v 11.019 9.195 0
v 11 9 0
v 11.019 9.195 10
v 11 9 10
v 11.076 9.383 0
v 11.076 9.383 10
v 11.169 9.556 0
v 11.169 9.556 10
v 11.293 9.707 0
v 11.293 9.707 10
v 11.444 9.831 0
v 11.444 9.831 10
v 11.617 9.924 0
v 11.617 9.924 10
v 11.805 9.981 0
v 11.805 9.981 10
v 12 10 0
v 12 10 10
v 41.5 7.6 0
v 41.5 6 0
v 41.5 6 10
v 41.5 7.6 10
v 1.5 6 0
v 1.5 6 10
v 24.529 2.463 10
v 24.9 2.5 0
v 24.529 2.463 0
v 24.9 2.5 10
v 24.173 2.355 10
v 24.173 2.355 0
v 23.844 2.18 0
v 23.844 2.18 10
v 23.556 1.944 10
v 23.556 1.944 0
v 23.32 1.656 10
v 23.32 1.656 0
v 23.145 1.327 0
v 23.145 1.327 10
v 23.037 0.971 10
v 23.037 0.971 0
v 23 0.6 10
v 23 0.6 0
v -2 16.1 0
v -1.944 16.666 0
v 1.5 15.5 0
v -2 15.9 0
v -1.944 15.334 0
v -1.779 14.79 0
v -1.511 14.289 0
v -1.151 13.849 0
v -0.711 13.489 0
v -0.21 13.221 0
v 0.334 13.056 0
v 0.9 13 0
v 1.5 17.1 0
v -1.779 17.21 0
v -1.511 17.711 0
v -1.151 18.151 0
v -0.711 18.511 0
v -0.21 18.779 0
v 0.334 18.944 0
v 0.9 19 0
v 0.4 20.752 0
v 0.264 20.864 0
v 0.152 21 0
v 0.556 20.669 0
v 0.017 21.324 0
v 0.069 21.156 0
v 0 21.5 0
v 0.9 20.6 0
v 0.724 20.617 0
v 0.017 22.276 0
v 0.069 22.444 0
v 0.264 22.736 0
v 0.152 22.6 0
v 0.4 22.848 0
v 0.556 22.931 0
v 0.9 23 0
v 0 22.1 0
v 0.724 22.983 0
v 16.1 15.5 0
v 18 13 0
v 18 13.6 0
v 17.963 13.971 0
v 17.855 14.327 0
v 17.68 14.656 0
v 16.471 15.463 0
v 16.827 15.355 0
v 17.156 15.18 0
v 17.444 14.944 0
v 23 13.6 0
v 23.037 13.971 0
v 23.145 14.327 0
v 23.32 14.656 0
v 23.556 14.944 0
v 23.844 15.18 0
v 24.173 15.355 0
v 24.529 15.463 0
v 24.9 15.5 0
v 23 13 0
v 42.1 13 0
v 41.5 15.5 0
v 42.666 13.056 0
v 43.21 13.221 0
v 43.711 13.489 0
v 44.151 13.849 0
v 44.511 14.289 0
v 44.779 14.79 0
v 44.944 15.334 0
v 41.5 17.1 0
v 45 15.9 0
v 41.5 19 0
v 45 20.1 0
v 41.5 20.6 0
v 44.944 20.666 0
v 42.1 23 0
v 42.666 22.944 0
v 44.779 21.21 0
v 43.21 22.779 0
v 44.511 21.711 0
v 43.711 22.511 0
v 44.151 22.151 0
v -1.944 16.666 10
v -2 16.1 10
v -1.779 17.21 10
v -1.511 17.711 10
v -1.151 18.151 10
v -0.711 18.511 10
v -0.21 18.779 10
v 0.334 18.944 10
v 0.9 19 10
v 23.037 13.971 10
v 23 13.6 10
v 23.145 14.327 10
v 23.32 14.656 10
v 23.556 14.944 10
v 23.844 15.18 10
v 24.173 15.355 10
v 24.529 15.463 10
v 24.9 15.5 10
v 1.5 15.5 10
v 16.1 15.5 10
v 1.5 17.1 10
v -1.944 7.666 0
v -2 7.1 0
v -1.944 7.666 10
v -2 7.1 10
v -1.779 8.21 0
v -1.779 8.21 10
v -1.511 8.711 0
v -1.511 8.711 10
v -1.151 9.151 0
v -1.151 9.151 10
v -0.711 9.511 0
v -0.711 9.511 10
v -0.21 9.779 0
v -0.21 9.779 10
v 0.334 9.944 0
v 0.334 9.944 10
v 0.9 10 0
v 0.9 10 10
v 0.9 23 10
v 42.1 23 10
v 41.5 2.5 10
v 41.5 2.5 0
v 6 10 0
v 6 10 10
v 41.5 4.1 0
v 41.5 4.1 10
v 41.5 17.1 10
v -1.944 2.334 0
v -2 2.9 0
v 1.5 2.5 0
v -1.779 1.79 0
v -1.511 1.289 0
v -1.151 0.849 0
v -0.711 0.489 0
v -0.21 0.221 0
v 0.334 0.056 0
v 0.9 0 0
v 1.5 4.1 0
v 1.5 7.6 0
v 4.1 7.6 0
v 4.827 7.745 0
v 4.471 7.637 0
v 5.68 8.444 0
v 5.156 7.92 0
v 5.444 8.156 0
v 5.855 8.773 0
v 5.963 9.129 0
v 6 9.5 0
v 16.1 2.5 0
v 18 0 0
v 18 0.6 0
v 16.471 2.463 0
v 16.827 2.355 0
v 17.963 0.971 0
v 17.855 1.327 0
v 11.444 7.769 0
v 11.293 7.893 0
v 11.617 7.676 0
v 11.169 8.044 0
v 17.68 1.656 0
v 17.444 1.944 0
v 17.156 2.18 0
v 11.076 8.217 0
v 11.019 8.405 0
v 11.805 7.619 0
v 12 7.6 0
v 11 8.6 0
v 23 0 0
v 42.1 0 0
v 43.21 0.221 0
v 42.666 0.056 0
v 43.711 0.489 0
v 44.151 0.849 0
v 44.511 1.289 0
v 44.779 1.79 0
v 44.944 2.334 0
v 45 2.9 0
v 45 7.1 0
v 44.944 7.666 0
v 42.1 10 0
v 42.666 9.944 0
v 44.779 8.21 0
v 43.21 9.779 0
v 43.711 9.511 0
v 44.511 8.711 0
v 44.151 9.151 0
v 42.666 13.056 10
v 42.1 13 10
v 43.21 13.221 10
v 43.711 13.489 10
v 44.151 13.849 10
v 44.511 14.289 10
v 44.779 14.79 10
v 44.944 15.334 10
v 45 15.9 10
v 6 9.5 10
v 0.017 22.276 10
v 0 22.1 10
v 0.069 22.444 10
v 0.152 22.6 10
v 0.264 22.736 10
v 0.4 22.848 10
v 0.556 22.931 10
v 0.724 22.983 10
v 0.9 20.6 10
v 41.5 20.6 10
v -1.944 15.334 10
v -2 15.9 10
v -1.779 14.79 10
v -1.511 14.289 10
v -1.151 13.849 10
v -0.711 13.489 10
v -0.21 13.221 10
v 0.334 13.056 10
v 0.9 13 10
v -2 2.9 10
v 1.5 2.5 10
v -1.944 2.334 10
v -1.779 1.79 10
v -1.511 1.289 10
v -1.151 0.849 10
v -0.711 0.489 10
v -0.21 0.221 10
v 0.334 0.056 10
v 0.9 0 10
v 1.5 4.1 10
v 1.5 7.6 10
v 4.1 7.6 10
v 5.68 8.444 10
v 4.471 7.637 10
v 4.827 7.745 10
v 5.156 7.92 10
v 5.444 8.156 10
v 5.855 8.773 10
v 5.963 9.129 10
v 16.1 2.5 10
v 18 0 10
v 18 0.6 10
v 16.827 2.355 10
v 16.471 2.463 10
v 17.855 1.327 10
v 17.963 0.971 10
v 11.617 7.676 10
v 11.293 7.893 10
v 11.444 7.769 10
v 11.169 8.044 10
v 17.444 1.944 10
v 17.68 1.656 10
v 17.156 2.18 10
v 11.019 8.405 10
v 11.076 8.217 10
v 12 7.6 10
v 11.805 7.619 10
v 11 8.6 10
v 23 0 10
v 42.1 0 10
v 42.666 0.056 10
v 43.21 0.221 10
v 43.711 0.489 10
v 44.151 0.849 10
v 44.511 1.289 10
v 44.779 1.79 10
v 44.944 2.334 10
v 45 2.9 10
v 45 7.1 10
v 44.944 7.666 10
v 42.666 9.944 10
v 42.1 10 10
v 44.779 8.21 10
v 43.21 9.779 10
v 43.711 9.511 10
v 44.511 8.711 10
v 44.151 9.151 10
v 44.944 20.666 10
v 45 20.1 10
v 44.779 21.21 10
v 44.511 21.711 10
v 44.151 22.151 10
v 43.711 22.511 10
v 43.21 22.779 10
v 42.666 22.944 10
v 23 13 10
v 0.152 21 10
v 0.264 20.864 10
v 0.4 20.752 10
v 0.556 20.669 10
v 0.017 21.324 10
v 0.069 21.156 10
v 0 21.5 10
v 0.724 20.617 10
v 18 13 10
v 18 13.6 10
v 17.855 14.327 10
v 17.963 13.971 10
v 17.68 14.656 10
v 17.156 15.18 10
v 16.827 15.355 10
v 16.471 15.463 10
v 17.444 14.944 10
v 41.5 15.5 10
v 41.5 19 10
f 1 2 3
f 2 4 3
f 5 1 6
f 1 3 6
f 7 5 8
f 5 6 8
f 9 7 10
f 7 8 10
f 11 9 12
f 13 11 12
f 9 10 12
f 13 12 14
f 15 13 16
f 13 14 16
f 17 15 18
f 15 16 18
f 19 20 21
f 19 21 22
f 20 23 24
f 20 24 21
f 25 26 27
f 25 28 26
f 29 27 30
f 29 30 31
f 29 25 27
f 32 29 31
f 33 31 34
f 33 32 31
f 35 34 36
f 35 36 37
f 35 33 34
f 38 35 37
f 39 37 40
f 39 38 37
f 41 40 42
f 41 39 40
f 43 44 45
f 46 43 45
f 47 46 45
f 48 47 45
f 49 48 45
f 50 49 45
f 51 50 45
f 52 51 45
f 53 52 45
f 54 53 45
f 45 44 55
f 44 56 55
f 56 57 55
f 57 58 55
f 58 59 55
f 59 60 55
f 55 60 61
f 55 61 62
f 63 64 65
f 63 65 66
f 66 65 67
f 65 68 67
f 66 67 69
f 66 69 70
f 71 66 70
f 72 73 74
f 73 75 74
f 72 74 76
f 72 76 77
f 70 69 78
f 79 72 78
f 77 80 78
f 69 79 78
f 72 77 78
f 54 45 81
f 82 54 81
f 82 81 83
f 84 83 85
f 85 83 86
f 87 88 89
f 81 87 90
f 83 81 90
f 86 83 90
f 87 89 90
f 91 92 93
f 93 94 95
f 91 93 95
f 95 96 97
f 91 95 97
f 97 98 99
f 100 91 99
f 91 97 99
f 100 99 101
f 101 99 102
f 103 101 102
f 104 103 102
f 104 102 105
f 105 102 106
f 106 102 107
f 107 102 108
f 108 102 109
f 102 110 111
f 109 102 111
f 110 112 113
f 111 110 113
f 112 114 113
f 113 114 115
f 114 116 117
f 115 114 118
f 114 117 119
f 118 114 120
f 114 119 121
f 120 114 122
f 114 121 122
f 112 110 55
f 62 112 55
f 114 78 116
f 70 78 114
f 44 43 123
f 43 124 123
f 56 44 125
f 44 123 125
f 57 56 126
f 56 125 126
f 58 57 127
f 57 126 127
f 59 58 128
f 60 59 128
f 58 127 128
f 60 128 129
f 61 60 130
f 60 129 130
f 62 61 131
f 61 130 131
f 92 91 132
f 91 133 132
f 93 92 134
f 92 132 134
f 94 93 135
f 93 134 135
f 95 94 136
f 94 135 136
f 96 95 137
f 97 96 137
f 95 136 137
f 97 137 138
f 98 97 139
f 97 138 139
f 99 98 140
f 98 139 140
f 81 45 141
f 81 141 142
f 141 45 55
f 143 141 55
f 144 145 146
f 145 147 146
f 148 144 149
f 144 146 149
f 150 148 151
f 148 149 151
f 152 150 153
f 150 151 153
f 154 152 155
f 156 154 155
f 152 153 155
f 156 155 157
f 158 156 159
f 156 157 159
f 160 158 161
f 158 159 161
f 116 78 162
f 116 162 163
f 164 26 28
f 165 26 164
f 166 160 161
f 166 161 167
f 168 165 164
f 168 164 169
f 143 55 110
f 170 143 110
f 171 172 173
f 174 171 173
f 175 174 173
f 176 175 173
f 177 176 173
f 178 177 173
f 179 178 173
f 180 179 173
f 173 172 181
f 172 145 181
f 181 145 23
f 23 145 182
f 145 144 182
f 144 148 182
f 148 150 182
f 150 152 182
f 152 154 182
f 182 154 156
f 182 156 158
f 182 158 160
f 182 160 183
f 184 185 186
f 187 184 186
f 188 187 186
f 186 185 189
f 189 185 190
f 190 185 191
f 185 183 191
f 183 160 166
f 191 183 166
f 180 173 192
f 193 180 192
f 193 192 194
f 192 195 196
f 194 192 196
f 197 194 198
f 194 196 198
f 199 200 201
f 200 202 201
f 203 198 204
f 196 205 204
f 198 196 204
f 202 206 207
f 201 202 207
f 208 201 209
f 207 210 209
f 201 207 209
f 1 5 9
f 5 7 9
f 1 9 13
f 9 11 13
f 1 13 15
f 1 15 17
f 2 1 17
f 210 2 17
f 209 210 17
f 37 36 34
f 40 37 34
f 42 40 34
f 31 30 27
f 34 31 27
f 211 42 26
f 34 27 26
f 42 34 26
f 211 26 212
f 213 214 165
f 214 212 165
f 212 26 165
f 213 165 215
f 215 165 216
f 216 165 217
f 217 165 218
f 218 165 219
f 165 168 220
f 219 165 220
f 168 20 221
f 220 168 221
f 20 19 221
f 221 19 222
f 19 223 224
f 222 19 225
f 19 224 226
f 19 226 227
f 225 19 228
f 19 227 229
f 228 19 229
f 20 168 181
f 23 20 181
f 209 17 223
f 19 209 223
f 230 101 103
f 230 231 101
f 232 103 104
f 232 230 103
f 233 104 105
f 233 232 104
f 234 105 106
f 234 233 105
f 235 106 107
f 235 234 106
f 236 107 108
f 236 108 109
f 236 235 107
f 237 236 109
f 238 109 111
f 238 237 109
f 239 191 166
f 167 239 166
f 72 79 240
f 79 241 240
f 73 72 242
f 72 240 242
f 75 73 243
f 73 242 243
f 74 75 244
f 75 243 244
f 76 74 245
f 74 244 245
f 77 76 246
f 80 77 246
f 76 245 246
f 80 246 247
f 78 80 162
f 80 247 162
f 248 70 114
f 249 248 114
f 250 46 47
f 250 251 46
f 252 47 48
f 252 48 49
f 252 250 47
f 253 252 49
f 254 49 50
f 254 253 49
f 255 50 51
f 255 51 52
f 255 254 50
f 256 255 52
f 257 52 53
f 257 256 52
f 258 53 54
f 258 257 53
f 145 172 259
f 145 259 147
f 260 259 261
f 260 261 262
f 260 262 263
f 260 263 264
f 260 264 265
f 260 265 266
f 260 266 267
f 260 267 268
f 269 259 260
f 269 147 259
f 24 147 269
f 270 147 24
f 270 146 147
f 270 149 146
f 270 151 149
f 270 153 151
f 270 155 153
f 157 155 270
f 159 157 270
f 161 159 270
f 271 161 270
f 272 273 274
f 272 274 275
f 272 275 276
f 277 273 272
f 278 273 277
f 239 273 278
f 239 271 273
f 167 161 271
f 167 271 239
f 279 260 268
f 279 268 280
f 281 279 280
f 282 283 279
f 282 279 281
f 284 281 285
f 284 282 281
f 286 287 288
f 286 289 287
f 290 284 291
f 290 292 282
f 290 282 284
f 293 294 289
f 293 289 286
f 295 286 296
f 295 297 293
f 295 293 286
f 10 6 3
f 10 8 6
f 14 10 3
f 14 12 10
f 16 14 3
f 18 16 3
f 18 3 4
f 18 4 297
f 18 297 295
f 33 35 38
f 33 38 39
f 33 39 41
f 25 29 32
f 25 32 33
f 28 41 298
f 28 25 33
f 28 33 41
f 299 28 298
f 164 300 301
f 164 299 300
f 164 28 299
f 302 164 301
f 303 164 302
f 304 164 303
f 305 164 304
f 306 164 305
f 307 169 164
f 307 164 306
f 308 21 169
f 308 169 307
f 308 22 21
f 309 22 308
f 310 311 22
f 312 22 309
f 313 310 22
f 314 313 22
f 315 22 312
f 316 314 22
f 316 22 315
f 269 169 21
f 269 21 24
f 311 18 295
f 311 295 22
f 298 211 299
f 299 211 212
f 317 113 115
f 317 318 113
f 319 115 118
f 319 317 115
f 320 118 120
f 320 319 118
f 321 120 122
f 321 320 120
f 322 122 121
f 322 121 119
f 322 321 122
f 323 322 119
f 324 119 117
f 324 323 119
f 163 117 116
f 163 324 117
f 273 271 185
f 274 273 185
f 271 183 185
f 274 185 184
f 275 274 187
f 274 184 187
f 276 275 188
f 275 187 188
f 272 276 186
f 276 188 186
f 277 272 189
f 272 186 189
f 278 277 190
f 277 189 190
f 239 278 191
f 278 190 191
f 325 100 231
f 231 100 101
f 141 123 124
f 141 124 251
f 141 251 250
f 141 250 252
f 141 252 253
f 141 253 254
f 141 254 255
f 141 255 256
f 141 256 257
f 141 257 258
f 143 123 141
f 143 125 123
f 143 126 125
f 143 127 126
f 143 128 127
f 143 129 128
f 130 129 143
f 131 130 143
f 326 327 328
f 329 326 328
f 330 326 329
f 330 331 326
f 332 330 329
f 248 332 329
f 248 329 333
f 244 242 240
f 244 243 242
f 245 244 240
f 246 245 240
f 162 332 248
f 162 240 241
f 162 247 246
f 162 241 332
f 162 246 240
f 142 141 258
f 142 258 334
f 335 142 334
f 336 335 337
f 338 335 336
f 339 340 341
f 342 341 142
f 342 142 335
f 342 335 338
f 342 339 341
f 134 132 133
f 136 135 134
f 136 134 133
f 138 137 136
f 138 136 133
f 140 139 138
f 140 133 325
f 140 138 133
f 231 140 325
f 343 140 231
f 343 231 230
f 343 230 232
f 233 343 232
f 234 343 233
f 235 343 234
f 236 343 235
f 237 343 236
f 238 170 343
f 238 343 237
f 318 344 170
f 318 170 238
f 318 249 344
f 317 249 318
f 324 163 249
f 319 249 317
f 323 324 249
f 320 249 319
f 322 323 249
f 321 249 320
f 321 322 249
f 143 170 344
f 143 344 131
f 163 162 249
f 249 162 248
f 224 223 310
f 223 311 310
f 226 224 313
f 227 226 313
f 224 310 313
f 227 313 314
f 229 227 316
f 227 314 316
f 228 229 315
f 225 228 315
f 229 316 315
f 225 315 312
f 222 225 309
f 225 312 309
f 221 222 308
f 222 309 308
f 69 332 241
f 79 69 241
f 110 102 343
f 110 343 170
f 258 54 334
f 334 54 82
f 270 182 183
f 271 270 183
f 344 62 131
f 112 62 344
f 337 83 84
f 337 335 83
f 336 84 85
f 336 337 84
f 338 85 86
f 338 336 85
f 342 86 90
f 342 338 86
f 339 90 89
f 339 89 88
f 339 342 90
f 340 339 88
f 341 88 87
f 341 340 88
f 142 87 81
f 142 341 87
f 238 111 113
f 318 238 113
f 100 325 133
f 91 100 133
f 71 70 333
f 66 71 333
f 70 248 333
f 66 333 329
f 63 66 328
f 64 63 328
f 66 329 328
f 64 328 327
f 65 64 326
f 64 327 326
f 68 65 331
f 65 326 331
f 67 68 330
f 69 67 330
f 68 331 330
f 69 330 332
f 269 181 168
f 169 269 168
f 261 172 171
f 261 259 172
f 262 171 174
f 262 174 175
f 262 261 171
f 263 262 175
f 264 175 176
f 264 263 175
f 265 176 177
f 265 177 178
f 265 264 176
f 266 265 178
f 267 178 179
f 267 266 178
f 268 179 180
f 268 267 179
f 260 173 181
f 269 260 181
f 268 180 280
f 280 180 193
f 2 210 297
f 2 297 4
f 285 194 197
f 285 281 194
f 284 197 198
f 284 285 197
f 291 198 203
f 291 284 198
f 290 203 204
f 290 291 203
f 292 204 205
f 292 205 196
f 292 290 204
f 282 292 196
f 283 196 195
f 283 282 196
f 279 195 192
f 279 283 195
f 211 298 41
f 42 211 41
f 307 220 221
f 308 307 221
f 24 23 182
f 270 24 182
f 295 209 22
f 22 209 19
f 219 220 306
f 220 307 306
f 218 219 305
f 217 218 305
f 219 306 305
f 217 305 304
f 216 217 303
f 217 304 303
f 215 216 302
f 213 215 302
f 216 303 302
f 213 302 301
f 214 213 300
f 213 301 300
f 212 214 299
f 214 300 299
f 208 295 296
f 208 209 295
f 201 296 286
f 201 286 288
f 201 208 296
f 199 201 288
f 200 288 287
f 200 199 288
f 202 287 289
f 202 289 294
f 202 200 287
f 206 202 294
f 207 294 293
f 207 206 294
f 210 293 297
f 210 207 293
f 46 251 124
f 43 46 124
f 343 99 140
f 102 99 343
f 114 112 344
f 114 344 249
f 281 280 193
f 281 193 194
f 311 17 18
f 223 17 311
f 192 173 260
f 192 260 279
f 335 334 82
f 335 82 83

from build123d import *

# Parameters (mm, degrees)
BOX003_W     = 5
BOX003_H     = 2.5
BOX003_DEPTH = 10
BOX_W        = 40
BOX_H        = 1.6
BOX_DEPTH    = 10
BOX002_W     = 40
BOX002_H     = 1.6
BOX002_DEPTH = 10
BOX004_W     = 5
BOX004_H     = 4
BOX004_DEPTH = 10
BOX001_W     = 47
BOX001_H     = 10
BOX001_DEPTH = 10
FILLET_R     = 2.9
FILLET001_R  = 1
FILLET002_R  = 1.9
FILLET003_R  = 1.9
BOX009_W     = 2
BOX009_H     = 4
BOX009_DEPTH = 10
BOX008_W     = 5
BOX008_H     = 2.5
BOX008_DEPTH = 10
BOX007_W     = 40
BOX007_H     = 1.6
BOX007_DEPTH = 10
BOX006_W     = 43
BOX006_H     = 1.6
BOX006_DEPTH = 10
BOX005_W     = 47
BOX005_H     = 10
BOX005_DEPTH = 10
FILLET004_R  = 2.9
FILLET005_R  = 0.9
FILLET006_R  = 1.9


with BuildPart() as cubo004:
    # Box003 → Box003 (new body)
    with BuildSketch(Plane(origin=(18, 0, 0), x_dir=(1, 0, 0), z_dir=(0, 0, 1))):
        with Locations((2.5, 1.25)):
            Rectangle(BOX003_W, BOX003_H)
    extrude(amount=BOX003_DEPTH)


with BuildPart() as cubo003:
    # Box → Box (new body)
    with BuildSketch(Plane(origin=(1.5, 2.5, 0), x_dir=(1, 0, 0), z_dir=(0, 0, 1))):
        with Locations((20, 0.8)):
            Rectangle(BOX_W, BOX_H)
    extrude(amount=BOX_DEPTH)


with BuildPart() as cubo002:
    # Box002 → Box002 (new body)
    with BuildSketch(Plane(origin=(1.5, 6, 0), x_dir=(1, 0, 0), z_dir=(0, 0, 1))):
        with Locations((20, 0.8)):
            Rectangle(BOX002_W, BOX002_H)
    extrude(amount=BOX002_DEPTH)


with BuildPart() as cubo005:
    # Box004 → Box004 (new body)
    with BuildSketch(Plane(origin=(6, 6, 0), x_dir=(1, 0, 0), z_dir=(0, 0, 1))):
        with Locations((2.5, 2)):
            Rectangle(BOX004_W, BOX004_H)
    extrude(amount=BOX004_DEPTH)


with BuildPart() as pechado:
    # Box001 → Box001 (new body)
    with BuildSketch(Plane(origin=(-2, 0, 0), x_dir=(1, 0, 0), z_dir=(0, 0, 1))):
        with Locations((23.5, 5)):
            Rectangle(BOX001_W, BOX001_H)
    extrude(amount=BOX001_DEPTH)

    # Cut: cut Cubo005
    add(cubo005.part, mode=Mode.SUBTRACT)

    # Cut001: cut Cubo002
    add(cubo002.part, mode=Mode.SUBTRACT)

    # Cut002: cut Cubo003
    add(cubo003.part, mode=Mode.SUBTRACT)

    # Cut003: cut Cubo004
    add(cubo004.part, mode=Mode.SUBTRACT)

    # Fillet
    fillet_edges = [pechado.edges().sort_by_distance(p)[0] for p in [
        (-2, 0, 5),
        (-2, 10, 5),
        (45, 10, 5),
        (45, 0, 5),
    ]]
    fillet(fillet_edges, radius=FILLET_R)

    # Fillet001
    fillet001_edges = [pechado.edges().sort_by_distance(p)[0] for p in [
        (11, 7.6, 5),
        (11, 10, 5),
    ]]
    fillet(fillet001_edges, radius=FILLET001_R)

    # Fillet002
    fillet002_edges = [pechado.edges().sort_by_distance(p)[0] for p in [
        (6, 7.6, 5),
    ]]
    fillet(fillet002_edges, radius=FILLET002_R)

    # Fillet003
    fillet003_edges = [pechado.edges().sort_by_distance(p)[0] for p in [
        (18, 2.5, 5),
        (23, 2.5, 5),
    ]]
    fillet(fillet003_edges, radius=FILLET003_R)


with BuildPart() as cubo009:
    # Box009 → Box009 (new body)
    with BuildSketch(Plane(origin=(-2, 19, 0), x_dir=(1, 0, 0), z_dir=(0, 0, 1))):
        with Locations((1, 2)):
            Rectangle(BOX009_W, BOX009_H)
    extrude(amount=BOX009_DEPTH)


with BuildPart() as cubo008:
    # Box008 → Box008 (new body)
    with BuildSketch(Plane(origin=(18, 13, 0), x_dir=(1, 0, 0), z_dir=(0, 0, 1))):
        with Locations((2.5, 1.25)):
            Rectangle(BOX008_W, BOX008_H)
    extrude(amount=BOX008_DEPTH)


with BuildPart() as cubo007:
    # Box007 → Box007 (new body)
    with BuildSketch(Plane(origin=(1.5, 15.5, 0), x_dir=(1, 0, 0), z_dir=(0, 0, 1))):
        with Locations((20, 0.8)):
            Rectangle(BOX007_W, BOX007_H)
    extrude(amount=BOX007_DEPTH)


with BuildPart() as cubo006:
    # Box006 → Box006 (new body)
    with BuildSketch(Plane(origin=(-1.5, 19, 0), x_dir=(1, 0, 0), z_dir=(0, 0, 1))):
        with Locations((21.5, 0.8)):
            Rectangle(BOX006_W, BOX006_H)
    extrude(amount=BOX006_DEPTH)


with BuildPart() as aberto:
    # Box005 → Box005 (new body)
    with BuildSketch(Plane(origin=(-2, 13, 0), x_dir=(1, 0, 0), z_dir=(0, 0, 1))):
        with Locations((23.5, 5)):
            Rectangle(BOX005_W, BOX005_H)
    extrude(amount=BOX005_DEPTH)

    # Cut004: cut Cubo006
    add(cubo006.part, mode=Mode.SUBTRACT)

    # Cut005: cut Cubo007
    add(cubo007.part, mode=Mode.SUBTRACT)

    # Cut006: cut Cubo008
    add(cubo008.part, mode=Mode.SUBTRACT)

    # Cut007: cut Cubo009
    add(cubo009.part, mode=Mode.SUBTRACT)

    # Fillet004
    fillet004_edges = [aberto.edges().sort_by_distance(p)[0] for p in [
        (-2, 19, 5),
        (-2, 13, 5),
        (45, 23, 5),
        (45, 13, 5),
    ]]
    fillet(fillet004_edges, radius=FILLET004_R)

    # Fillet005
    fillet005_edges = [aberto.edges().sort_by_distance(p)[0] for p in [
        (0, 23, 5),
        (0, 20.6, 5),
    ]]
    fillet(fillet005_edges, radius=FILLET005_R)

    # Fillet006
    fillet006_edges = [aberto.edges().sort_by_distance(p)[0] for p in [
        (23, 15.5, 5),
        (18, 15.5, 5),
    ]]
    fillet(fillet006_edges, radius=FILLET006_R)


solid = Compound([pechado.part, aberto.part])
